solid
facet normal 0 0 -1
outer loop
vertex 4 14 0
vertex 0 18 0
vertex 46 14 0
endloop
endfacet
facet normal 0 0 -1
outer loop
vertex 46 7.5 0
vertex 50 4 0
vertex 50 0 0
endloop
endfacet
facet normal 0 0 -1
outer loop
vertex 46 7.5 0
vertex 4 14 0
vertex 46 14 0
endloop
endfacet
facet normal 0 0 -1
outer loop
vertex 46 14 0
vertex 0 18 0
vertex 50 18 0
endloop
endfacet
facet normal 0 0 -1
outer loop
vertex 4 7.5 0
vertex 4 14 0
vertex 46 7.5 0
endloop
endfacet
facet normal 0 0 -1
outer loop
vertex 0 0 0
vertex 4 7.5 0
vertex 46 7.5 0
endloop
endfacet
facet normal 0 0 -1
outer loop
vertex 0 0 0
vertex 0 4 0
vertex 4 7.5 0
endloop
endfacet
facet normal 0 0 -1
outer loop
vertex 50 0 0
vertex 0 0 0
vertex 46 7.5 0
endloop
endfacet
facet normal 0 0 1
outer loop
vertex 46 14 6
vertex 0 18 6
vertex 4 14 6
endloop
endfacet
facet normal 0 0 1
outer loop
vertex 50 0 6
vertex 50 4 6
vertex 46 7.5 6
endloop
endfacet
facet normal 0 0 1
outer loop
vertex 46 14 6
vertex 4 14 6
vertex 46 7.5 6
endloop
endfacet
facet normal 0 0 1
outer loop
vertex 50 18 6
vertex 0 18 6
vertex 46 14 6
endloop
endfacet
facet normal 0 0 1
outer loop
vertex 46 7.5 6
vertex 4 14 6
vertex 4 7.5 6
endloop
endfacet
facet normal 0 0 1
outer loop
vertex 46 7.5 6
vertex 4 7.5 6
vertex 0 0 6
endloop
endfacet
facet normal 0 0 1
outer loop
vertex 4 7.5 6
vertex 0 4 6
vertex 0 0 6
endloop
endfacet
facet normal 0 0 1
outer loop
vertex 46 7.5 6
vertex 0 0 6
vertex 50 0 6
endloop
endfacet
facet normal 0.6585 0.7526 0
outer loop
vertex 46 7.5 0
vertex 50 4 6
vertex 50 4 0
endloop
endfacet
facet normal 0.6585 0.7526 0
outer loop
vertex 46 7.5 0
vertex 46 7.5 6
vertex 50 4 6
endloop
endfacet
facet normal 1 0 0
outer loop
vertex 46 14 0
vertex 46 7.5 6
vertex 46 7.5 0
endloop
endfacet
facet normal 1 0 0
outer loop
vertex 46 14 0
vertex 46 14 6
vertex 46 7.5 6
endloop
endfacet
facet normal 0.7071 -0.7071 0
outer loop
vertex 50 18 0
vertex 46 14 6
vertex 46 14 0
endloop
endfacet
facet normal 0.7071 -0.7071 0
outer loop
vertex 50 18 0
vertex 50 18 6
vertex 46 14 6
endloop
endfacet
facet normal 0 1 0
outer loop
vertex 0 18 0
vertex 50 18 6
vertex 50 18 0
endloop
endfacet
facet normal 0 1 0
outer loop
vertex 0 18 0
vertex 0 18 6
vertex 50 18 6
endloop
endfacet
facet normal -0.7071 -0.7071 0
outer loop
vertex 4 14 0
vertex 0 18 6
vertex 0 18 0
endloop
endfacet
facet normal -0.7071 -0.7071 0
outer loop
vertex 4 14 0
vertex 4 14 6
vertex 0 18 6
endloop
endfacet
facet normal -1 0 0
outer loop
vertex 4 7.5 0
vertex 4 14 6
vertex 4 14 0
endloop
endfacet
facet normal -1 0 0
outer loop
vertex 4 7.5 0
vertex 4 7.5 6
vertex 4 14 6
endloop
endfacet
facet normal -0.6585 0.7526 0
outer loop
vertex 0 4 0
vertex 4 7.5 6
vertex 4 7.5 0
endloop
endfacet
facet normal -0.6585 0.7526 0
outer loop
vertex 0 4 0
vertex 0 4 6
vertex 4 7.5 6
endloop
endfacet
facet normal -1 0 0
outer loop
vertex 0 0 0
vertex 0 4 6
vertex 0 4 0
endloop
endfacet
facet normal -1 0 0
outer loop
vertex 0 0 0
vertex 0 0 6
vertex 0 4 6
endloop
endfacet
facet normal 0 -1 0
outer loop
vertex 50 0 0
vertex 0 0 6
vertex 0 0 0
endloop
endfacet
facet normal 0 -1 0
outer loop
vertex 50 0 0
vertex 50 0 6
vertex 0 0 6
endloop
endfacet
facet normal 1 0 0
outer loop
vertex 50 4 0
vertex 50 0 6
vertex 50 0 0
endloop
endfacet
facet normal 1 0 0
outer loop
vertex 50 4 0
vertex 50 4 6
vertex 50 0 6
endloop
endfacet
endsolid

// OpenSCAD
$fn = 32;

// ----------------------------------------------------------------------
// Key bar: dovetail key, 6 mm thick
// ----------------------------------------------------------------------

// --- parameters (mm) ---
profile_height = 6;       // extrusion height
profile_points = 10;      // points of the closed outline

profile = [[0, 0], [50, 0], [50, 4], [46, 7.5], [46, 14], [50, 18], [0, 18], [4, 14], [4, 7.5], [0, 4]];  // single closed polygon, 10 points, counter clockwise

// --- the one profile operation ---
linear_extrude(height = profile_height) polygon(points = profile);
